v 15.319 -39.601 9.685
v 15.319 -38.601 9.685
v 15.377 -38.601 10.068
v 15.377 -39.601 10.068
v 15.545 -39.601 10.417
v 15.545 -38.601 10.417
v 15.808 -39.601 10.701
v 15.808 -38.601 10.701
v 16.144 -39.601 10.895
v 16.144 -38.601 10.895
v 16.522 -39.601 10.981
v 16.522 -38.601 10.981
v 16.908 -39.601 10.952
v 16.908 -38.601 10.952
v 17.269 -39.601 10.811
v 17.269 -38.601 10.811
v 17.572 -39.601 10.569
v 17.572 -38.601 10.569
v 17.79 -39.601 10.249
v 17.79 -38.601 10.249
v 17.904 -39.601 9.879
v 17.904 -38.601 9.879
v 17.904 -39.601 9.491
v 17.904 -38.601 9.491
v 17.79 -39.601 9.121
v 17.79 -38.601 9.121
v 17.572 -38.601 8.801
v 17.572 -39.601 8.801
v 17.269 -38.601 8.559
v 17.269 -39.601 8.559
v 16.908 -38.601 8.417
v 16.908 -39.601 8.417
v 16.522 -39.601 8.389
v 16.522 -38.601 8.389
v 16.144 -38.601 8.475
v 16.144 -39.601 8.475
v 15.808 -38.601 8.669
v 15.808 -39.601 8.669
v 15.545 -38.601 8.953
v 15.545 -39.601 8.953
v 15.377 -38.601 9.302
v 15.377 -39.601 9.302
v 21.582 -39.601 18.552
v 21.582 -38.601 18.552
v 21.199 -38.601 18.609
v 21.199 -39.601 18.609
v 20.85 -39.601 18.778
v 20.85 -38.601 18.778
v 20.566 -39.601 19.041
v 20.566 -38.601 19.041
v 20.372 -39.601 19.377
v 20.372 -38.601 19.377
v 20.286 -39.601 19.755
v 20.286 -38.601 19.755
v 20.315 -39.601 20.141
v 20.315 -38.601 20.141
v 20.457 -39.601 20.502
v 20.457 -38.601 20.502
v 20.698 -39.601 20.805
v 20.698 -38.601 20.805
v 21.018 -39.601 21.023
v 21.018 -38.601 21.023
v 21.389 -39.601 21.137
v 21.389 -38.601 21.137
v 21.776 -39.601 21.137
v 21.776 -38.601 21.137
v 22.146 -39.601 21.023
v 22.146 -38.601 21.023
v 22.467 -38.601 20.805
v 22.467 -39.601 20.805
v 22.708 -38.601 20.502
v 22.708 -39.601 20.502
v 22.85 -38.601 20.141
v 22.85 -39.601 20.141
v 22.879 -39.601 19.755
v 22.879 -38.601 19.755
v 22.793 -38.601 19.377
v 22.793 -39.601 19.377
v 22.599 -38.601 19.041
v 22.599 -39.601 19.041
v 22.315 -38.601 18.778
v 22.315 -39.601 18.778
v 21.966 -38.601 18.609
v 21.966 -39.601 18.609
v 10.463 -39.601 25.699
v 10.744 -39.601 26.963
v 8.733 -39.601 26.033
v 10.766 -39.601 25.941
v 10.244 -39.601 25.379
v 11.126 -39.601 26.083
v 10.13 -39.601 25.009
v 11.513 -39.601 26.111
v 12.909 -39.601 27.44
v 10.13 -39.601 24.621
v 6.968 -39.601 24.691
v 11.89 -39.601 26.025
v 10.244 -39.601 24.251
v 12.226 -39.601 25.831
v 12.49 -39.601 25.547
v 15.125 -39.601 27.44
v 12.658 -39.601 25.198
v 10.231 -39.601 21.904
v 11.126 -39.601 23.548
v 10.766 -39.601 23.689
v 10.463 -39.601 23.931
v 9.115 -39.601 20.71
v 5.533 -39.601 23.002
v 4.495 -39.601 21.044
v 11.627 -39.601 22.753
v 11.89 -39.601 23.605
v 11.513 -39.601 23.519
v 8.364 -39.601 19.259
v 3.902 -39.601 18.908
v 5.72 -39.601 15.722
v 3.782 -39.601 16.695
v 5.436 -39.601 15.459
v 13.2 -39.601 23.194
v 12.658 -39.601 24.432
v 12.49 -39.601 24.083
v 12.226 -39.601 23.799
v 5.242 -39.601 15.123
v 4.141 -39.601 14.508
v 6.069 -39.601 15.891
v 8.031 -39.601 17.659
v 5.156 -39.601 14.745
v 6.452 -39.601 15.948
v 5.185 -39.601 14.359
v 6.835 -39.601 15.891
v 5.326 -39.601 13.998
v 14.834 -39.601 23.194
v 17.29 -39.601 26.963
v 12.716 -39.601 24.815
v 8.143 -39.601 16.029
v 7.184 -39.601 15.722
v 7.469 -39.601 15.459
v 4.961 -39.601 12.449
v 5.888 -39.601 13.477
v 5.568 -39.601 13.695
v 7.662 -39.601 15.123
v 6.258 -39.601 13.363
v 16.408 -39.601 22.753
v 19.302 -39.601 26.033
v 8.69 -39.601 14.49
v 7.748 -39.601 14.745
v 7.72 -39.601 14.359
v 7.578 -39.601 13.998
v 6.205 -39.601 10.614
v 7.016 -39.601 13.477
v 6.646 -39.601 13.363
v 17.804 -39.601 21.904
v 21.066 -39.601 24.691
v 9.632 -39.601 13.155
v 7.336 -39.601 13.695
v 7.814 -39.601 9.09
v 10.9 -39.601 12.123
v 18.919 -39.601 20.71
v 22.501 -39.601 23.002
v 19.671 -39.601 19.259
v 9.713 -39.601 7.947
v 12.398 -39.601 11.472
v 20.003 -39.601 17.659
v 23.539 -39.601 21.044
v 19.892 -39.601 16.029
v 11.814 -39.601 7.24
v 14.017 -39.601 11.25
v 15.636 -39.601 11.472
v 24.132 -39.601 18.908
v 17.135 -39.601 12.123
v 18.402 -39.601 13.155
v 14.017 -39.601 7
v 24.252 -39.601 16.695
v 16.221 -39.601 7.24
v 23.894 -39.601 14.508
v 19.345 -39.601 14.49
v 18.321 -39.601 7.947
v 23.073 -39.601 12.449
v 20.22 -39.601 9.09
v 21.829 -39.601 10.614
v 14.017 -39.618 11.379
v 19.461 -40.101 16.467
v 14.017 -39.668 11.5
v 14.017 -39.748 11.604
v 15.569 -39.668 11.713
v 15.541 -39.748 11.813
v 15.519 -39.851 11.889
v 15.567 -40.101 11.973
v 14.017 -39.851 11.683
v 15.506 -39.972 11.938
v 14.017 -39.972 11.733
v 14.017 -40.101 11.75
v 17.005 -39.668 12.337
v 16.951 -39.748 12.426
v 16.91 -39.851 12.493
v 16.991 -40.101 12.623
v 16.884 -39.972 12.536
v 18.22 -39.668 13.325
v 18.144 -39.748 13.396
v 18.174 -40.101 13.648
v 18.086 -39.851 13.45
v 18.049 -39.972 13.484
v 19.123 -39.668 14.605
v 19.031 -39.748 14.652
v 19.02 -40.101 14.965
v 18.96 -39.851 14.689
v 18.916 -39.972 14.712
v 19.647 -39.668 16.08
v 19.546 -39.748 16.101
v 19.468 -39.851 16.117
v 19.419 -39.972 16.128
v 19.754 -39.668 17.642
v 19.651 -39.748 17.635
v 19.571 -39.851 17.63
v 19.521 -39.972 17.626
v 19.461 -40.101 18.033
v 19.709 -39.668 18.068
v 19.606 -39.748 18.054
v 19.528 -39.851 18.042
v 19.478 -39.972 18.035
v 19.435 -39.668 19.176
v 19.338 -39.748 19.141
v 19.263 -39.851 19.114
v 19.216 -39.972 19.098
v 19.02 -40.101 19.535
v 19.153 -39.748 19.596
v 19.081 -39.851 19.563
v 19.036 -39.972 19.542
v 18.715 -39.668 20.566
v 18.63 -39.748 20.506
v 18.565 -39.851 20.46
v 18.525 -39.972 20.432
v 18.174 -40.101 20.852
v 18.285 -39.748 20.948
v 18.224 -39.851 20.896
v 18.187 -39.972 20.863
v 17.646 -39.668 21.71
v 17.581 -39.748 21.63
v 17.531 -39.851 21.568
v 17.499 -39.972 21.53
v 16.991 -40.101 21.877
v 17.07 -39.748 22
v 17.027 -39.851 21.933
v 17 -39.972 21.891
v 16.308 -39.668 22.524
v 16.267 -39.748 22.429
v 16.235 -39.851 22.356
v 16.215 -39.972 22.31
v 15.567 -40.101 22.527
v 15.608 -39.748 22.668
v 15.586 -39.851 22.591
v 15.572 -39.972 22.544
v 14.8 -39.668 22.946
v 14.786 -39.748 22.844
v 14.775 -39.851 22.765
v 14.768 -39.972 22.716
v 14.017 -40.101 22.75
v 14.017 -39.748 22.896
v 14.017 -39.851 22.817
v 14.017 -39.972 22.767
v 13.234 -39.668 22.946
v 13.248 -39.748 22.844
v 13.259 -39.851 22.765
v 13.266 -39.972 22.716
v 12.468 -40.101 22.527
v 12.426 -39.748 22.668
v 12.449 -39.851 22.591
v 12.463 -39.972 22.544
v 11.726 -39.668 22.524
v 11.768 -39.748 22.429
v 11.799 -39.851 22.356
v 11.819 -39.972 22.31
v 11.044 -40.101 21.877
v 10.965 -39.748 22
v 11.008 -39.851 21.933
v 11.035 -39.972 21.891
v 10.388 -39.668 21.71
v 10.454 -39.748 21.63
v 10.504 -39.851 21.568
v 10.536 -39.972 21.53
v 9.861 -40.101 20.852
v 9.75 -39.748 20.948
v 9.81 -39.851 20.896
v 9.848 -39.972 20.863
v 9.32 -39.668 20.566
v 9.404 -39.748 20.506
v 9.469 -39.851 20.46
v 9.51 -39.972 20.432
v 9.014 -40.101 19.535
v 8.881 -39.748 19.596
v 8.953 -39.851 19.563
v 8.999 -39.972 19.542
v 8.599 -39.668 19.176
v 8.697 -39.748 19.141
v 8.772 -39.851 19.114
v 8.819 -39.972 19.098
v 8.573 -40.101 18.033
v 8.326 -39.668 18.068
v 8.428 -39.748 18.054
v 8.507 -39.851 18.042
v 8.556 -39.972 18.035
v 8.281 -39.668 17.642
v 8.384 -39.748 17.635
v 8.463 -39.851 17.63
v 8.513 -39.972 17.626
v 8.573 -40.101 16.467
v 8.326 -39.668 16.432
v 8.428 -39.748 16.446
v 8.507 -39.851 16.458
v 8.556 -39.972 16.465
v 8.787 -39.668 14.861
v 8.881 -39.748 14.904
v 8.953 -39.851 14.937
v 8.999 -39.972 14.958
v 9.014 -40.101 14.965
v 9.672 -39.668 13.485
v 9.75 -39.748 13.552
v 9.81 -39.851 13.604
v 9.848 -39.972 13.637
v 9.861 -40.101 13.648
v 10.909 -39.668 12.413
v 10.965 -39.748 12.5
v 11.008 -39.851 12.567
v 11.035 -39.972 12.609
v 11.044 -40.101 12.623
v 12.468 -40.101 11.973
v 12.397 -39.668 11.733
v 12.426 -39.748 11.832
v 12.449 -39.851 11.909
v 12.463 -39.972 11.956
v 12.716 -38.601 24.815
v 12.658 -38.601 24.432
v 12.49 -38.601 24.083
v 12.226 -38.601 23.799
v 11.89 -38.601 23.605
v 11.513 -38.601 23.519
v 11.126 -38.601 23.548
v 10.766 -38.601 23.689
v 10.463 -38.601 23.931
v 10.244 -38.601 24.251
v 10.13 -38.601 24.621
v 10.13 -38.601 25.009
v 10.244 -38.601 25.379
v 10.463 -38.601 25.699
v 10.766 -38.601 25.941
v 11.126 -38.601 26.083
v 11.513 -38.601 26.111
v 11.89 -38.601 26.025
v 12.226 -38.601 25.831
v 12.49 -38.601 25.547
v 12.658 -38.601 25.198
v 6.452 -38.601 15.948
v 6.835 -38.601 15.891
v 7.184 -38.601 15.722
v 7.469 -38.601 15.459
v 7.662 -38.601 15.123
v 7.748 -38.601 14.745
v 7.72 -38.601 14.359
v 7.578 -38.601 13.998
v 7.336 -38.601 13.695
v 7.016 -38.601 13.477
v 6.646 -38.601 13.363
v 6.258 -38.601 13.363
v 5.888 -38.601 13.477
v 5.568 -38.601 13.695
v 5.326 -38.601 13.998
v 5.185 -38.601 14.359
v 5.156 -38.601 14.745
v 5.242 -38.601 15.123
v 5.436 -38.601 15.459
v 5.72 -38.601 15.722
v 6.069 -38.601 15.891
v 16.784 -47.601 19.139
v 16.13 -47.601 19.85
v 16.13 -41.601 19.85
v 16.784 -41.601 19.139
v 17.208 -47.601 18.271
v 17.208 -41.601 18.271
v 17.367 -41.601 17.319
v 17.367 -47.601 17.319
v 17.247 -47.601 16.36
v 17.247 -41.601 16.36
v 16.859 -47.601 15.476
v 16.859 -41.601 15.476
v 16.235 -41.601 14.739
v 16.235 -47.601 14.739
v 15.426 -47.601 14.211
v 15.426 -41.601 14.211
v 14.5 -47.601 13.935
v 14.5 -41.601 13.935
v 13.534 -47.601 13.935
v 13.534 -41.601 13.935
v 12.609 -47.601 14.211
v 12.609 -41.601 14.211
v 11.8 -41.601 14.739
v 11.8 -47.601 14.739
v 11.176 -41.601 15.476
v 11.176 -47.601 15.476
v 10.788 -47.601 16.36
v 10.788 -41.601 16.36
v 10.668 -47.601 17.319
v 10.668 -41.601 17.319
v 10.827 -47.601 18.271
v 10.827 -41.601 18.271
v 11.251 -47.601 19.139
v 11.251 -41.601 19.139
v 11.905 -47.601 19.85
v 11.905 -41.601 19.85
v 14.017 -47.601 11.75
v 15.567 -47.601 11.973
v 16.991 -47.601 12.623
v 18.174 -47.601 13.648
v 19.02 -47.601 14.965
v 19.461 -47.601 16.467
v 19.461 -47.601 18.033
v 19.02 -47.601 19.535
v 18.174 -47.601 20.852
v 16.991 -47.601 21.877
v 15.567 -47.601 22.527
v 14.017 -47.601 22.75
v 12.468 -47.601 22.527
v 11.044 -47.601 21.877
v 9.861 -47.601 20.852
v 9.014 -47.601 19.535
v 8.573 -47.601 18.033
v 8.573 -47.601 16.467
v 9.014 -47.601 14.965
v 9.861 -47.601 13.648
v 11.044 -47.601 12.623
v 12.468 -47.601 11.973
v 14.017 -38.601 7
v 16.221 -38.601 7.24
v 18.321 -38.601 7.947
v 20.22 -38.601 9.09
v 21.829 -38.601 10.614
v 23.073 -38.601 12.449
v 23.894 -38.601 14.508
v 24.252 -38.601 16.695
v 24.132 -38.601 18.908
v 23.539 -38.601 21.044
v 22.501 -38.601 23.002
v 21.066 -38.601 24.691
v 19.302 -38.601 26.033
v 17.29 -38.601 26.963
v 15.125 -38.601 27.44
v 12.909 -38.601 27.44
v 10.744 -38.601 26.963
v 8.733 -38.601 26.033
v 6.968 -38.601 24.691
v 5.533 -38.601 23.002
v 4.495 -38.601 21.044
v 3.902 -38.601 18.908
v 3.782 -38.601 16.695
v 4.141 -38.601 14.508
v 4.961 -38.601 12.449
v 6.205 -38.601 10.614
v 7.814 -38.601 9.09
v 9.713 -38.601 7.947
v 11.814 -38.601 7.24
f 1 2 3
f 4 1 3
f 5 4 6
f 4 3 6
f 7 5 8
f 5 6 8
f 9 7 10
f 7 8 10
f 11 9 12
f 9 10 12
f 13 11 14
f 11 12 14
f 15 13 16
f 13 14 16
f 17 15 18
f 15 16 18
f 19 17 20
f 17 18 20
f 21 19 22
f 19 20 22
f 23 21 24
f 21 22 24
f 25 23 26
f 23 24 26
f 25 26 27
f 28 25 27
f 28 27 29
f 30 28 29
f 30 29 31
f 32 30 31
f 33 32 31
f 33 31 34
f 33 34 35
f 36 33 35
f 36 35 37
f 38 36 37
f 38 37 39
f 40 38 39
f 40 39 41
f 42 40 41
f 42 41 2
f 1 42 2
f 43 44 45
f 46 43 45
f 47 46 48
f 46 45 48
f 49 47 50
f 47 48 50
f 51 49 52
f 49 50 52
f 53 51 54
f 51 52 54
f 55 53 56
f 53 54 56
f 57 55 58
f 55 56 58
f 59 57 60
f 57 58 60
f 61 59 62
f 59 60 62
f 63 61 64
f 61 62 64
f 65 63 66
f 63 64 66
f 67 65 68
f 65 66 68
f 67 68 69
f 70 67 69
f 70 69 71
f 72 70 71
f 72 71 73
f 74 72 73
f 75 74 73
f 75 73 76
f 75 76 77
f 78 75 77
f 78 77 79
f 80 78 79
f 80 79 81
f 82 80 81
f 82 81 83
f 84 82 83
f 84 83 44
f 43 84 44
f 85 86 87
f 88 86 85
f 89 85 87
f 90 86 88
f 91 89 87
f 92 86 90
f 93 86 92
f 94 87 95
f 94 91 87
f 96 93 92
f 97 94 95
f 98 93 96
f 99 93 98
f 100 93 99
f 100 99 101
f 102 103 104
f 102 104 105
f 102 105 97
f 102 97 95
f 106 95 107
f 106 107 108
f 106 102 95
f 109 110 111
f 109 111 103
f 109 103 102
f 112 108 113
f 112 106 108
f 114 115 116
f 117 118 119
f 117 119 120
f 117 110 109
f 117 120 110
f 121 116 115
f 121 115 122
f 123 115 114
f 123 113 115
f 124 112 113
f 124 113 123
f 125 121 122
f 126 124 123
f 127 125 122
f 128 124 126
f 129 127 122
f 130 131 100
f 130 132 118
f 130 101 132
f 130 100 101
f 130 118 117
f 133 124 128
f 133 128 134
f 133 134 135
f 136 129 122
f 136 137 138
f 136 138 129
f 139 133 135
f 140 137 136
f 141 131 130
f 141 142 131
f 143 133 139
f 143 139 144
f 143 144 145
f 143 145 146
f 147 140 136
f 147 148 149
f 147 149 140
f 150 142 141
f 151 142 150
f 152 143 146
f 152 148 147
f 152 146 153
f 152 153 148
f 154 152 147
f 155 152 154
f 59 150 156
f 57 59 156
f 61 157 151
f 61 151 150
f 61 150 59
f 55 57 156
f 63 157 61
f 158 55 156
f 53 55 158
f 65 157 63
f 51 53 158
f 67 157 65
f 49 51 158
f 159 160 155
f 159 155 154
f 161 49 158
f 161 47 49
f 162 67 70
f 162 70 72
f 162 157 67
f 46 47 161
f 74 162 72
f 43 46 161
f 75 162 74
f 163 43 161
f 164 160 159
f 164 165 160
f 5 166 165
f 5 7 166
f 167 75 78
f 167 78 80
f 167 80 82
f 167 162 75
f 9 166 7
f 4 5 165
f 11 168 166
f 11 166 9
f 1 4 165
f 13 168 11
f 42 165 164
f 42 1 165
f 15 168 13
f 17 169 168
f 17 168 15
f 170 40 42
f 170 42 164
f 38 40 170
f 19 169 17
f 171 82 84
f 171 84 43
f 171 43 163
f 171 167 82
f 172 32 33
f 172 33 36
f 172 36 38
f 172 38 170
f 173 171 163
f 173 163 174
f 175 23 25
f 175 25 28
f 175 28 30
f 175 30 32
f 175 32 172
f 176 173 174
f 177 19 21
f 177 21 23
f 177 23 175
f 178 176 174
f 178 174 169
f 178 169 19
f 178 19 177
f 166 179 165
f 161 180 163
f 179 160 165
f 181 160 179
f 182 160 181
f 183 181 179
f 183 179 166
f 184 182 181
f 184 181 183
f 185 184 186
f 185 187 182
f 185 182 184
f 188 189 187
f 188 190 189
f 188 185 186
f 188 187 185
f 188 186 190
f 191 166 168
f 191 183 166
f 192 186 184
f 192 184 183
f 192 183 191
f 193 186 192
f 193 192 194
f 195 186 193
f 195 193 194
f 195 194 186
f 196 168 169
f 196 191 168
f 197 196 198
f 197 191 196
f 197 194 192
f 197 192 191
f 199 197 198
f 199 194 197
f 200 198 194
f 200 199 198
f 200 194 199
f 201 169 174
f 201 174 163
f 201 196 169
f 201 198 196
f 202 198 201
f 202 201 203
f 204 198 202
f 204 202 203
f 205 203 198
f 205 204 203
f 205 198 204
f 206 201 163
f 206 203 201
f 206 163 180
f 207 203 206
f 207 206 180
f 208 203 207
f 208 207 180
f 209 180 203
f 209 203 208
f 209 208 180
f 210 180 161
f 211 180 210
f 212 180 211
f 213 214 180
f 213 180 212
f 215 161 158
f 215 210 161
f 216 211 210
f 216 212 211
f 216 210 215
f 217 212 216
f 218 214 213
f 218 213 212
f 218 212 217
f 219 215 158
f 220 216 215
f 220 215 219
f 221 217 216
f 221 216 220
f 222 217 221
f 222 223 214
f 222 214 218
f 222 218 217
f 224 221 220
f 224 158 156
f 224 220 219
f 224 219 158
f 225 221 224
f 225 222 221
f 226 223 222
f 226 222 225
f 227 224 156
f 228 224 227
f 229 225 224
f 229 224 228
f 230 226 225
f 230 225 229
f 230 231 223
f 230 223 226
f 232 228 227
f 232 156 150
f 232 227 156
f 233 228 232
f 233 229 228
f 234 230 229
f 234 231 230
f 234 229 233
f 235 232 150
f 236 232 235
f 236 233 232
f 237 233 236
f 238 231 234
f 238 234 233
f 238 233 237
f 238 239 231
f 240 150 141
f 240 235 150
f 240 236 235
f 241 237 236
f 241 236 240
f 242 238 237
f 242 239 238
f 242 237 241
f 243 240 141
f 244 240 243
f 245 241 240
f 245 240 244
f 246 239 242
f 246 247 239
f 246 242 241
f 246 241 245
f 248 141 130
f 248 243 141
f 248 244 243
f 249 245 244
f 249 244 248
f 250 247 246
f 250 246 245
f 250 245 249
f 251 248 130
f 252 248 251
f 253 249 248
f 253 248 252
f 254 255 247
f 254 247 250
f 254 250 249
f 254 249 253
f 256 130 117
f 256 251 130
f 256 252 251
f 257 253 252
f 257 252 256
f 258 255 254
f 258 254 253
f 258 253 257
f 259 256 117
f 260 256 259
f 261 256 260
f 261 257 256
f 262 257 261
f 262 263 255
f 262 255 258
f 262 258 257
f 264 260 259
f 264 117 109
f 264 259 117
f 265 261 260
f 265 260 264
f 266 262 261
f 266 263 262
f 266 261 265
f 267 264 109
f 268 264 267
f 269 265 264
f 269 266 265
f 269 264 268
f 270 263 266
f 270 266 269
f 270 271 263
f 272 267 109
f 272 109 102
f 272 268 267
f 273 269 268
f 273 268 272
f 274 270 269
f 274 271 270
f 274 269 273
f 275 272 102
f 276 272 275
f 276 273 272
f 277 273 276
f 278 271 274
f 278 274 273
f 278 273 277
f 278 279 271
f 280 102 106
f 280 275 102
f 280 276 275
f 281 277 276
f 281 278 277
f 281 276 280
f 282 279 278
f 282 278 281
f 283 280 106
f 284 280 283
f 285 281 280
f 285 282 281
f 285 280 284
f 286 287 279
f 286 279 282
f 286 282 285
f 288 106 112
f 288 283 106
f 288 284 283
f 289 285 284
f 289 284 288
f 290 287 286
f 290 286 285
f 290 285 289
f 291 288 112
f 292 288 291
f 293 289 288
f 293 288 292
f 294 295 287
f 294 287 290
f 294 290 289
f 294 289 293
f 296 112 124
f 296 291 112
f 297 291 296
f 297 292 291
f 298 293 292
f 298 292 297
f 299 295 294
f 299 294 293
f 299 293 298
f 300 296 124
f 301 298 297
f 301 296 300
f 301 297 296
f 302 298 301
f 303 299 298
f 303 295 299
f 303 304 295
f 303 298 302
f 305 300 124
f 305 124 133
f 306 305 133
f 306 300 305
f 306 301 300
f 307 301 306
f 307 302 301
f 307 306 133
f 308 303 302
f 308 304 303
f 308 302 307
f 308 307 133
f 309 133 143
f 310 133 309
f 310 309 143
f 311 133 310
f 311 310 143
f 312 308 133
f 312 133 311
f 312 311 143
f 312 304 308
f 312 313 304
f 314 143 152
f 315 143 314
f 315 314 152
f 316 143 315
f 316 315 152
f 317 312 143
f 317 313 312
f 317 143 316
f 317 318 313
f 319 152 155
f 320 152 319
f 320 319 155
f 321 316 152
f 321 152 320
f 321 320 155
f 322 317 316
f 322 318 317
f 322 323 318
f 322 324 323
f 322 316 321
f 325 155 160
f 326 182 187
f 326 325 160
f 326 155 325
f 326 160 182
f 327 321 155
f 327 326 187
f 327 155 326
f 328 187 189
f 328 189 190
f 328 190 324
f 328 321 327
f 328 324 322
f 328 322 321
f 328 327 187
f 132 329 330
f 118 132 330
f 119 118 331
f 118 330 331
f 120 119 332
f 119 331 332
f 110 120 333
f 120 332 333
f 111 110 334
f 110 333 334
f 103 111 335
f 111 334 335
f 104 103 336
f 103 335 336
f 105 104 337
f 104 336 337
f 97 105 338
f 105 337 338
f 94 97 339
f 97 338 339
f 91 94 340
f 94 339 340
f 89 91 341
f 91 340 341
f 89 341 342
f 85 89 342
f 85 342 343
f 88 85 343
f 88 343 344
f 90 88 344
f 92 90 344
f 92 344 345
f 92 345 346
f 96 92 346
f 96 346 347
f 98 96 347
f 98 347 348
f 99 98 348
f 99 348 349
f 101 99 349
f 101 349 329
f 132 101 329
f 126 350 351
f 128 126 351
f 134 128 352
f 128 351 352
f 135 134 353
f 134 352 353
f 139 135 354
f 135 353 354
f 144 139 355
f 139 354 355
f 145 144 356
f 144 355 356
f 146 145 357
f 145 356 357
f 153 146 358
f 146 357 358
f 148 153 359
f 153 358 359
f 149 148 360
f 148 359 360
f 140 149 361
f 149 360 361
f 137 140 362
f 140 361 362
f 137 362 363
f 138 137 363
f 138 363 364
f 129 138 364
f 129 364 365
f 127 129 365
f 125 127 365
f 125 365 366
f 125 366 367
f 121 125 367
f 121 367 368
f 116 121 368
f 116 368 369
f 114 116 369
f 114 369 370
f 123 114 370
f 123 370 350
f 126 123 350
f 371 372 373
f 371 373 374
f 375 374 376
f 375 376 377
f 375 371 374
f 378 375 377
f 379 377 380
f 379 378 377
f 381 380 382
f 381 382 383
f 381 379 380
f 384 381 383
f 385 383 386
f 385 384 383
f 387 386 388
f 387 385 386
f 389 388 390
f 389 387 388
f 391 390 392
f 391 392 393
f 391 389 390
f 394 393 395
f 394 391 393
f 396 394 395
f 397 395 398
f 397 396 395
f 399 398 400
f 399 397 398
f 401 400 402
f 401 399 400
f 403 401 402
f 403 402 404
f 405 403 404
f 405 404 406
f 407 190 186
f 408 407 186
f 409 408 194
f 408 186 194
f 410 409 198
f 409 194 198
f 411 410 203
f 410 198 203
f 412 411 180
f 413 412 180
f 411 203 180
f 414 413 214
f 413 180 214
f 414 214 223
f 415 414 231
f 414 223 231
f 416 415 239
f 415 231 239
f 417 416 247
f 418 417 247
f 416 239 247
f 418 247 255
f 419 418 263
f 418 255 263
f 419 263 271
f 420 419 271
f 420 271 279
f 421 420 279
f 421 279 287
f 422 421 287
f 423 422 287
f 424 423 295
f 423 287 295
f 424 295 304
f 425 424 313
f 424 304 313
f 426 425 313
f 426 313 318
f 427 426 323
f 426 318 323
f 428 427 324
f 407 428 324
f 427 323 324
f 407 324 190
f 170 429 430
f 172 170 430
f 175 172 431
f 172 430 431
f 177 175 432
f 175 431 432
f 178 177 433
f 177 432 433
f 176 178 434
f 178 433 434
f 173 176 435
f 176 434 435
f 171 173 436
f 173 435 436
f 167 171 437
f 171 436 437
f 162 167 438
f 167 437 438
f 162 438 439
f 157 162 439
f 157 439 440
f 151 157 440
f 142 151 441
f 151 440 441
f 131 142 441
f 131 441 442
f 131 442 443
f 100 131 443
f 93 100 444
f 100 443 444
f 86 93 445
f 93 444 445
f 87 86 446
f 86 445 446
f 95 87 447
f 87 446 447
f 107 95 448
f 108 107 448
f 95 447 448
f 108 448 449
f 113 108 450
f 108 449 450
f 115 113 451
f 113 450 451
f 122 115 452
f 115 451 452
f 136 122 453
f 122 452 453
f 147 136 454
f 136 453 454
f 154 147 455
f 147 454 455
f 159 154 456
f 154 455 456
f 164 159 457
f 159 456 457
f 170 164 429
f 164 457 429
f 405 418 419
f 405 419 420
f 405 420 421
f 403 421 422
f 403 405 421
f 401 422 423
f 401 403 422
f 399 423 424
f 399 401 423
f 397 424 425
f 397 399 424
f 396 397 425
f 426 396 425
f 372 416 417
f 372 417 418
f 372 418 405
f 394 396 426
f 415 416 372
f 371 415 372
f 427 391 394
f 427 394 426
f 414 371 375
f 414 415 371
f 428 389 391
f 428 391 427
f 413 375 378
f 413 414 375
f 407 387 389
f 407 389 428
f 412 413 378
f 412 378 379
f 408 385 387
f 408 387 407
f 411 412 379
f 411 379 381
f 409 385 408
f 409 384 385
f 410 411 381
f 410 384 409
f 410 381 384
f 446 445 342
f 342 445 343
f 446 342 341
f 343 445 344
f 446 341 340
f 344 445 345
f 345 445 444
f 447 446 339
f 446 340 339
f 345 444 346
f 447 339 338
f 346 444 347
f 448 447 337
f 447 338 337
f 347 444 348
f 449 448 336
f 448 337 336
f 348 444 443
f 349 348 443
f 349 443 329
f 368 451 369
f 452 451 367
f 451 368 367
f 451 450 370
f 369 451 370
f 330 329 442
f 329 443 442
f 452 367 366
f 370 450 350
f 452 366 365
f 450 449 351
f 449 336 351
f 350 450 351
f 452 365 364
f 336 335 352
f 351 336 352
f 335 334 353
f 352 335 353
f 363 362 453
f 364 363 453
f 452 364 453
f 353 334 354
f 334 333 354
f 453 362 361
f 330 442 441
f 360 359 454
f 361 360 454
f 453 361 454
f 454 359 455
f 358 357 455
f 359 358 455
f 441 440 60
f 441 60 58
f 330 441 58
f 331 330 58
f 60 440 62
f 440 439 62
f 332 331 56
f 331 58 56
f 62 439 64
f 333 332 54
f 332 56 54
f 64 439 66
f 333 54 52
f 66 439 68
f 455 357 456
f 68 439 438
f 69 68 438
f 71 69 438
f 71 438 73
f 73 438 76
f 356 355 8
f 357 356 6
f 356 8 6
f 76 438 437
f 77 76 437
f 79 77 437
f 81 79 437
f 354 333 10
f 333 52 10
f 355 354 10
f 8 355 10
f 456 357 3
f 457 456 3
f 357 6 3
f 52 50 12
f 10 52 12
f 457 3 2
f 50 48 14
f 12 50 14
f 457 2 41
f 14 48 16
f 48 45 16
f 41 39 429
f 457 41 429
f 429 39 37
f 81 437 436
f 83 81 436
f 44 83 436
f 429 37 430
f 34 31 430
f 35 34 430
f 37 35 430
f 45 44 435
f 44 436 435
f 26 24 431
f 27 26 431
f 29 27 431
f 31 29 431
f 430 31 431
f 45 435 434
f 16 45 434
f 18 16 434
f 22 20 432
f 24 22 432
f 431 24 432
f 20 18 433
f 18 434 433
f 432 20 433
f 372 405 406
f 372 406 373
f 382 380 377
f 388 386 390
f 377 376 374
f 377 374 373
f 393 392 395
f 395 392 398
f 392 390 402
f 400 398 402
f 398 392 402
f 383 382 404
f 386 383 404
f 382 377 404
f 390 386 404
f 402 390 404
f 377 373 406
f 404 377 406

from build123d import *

# Parameters (mm, degrees)
ESQUISSE1_R                  = 10.25
BOSS_EXTRU_1_DEPTH           = 1
D_GAGEMENT_M21_D             = 2.6
R_P_TITION_CIRCULAIRE1_COUNT = 4
ESQUISSE9_R                  = 5.5
BOSS_EXTRU_4_DEPTH           = 8
ENL_V_MAT_EXTRU_1_DEPTH      = 6
CONG_1_R                     = 0.5


with BuildPart() as part:
    # Esquisse1 → Boss.-Extru.1 (new body)
    with BuildSketch(Plane.XZ.offset(38.601290575)):
        with Locations(Location((14.017249305, 17.25, 0), (0, 0, 270))):
            Circle(ESQUISSE1_R)
    extrude(amount=BOSS_EXTRU_1_DEPTH)

    # Dégagement M21 (through all)
    with Locations(Plane(origin=(0, -39.601290575, 0), x_dir=(-1, 0, 0), z_dir=(0, -1, 0))):
        with Locations((-11.415520349, -24.815117741)):
            d_gagement_m21 = Hole(D_GAGEMENT_M21_D / 2)

    # Répétition circulaire1: Dégagement M21 ×4 about axis
    r_p_tition_circulaire1_axis = Axis((14.017249305, 0, 17.25), (0, 1, 0))
    for i in range(1, R_P_TITION_CIRCULAIRE1_COUNT):
        add(d_gagement_m21.rotate(r_p_tition_circulaire1_axis, i * 360 / R_P_TITION_CIRCULAIRE1_COUNT), mode=Mode.SUBTRACT)

    # Esquisse9 → Boss.-Extru.4 (add)
    with BuildSketch(Plane(origin=(0, -39.601290575, 0), x_dir=(-1, 0, 0), z_dir=(0, -1, 0))):
        with Locations(Location((-14.017249305, -17.25, 0), (0, 0, 90))):
            Circle(ESQUISSE9_R)
    extrude(amount=BOSS_EXTRU_4_DEPTH)

    # Esquisse10 → Enlèv. mat.-Extru.1 (cut)
    with BuildSketch(Plane.XZ.offset(47.601290575)):
        with BuildLine():
            Line((11.904786288, 19.85), (16.129712323, 19.85))
            ThreePointArc((16.129712323, 19.85), (14.017249305, 13.9), (11.904786288, 19.85))
        make_face()
    extrude(amount=-ENL_V_MAT_EXTRU_1_DEPTH, mode=Mode.SUBTRACT)

    # Congé1
    cong_1_edges = [part.edges().sort_by_distance(p)[0] for p in [
        (14.017249305, -39.601290575, 22.75),
    ]]
    fillet(cong_1_edges, radius=CONG_1_R)


solid = part.part
